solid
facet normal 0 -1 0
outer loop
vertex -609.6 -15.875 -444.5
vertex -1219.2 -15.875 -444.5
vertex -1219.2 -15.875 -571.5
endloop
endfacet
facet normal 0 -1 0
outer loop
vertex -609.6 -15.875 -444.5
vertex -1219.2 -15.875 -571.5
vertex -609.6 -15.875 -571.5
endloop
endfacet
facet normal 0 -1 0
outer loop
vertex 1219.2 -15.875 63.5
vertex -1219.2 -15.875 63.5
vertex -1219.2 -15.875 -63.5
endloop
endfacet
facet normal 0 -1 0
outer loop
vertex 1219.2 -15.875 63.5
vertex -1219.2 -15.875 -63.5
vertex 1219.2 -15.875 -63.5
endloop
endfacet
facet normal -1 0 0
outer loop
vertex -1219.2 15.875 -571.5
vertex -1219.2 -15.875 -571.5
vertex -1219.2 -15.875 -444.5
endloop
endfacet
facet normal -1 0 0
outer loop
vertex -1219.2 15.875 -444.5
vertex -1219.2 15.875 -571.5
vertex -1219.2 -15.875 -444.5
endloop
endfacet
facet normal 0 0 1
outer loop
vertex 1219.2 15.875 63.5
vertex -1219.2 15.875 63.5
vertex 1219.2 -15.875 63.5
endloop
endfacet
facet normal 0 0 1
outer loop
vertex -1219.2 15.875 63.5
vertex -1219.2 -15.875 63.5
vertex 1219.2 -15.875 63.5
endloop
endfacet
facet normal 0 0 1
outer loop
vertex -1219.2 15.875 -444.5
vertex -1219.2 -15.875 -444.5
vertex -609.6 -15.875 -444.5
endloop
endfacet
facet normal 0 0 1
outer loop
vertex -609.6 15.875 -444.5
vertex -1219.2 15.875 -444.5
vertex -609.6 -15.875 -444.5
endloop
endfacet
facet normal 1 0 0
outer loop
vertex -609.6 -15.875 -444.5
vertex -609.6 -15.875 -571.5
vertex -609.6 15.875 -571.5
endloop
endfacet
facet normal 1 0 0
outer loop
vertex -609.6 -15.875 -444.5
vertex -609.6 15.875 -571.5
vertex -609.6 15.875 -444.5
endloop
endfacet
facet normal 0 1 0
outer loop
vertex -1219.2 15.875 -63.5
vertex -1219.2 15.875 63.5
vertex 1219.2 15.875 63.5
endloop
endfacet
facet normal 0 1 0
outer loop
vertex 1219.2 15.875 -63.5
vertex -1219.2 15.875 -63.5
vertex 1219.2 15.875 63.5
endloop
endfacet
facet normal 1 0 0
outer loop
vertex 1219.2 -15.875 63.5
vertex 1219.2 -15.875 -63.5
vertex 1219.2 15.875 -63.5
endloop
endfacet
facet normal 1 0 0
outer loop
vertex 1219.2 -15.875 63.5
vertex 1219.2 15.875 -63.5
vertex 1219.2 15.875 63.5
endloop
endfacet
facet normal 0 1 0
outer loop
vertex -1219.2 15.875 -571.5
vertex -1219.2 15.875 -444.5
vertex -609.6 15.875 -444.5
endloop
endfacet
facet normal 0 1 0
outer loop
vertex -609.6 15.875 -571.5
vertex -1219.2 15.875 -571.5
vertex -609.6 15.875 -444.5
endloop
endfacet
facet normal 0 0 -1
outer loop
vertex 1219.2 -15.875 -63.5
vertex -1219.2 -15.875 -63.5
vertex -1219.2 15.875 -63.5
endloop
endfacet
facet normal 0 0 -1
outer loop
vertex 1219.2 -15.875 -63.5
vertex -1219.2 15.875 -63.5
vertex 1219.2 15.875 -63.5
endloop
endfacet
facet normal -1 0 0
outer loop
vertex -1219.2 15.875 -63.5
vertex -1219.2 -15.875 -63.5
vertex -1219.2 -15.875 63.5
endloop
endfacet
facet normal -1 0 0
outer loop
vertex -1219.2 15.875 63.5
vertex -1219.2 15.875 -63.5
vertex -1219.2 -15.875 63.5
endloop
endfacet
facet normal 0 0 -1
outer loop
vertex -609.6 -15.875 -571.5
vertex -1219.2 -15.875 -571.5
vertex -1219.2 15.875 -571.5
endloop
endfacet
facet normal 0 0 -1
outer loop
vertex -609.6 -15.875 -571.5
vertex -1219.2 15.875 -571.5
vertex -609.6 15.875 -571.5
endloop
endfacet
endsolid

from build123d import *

# Parameters (mm, degrees)
F0_W     = 2438.4
F0_H     = 127
F1_DEPTH = 15.875
F3_W     = 1828.8
F3_H     = 127
F4_DEPTH = 31.75


with BuildPart() as f1:
    # F0 (on Front) → F1 (new body, symmetric)
    with BuildSketch(Plane.XZ):
        Rectangle(F0_W, F0_H)
    extrude(amount=F1_DEPTH, both=True)


with BuildPart() as f2_1:
    # F2: copy of F1
    add(f1.part.moved(Location((0, 0, -508))))

    # F3 (on face) → F4 (cut)
    with BuildSketch(Plane.XZ.offset(15.875)):
        with Locations((304.8, -508)):
            Rectangle(F3_W, F3_H)
    extrude(amount=-F4_DEPTH, mode=Mode.SUBTRACT)


solid = Compound([f1.part, f2_1.part])
